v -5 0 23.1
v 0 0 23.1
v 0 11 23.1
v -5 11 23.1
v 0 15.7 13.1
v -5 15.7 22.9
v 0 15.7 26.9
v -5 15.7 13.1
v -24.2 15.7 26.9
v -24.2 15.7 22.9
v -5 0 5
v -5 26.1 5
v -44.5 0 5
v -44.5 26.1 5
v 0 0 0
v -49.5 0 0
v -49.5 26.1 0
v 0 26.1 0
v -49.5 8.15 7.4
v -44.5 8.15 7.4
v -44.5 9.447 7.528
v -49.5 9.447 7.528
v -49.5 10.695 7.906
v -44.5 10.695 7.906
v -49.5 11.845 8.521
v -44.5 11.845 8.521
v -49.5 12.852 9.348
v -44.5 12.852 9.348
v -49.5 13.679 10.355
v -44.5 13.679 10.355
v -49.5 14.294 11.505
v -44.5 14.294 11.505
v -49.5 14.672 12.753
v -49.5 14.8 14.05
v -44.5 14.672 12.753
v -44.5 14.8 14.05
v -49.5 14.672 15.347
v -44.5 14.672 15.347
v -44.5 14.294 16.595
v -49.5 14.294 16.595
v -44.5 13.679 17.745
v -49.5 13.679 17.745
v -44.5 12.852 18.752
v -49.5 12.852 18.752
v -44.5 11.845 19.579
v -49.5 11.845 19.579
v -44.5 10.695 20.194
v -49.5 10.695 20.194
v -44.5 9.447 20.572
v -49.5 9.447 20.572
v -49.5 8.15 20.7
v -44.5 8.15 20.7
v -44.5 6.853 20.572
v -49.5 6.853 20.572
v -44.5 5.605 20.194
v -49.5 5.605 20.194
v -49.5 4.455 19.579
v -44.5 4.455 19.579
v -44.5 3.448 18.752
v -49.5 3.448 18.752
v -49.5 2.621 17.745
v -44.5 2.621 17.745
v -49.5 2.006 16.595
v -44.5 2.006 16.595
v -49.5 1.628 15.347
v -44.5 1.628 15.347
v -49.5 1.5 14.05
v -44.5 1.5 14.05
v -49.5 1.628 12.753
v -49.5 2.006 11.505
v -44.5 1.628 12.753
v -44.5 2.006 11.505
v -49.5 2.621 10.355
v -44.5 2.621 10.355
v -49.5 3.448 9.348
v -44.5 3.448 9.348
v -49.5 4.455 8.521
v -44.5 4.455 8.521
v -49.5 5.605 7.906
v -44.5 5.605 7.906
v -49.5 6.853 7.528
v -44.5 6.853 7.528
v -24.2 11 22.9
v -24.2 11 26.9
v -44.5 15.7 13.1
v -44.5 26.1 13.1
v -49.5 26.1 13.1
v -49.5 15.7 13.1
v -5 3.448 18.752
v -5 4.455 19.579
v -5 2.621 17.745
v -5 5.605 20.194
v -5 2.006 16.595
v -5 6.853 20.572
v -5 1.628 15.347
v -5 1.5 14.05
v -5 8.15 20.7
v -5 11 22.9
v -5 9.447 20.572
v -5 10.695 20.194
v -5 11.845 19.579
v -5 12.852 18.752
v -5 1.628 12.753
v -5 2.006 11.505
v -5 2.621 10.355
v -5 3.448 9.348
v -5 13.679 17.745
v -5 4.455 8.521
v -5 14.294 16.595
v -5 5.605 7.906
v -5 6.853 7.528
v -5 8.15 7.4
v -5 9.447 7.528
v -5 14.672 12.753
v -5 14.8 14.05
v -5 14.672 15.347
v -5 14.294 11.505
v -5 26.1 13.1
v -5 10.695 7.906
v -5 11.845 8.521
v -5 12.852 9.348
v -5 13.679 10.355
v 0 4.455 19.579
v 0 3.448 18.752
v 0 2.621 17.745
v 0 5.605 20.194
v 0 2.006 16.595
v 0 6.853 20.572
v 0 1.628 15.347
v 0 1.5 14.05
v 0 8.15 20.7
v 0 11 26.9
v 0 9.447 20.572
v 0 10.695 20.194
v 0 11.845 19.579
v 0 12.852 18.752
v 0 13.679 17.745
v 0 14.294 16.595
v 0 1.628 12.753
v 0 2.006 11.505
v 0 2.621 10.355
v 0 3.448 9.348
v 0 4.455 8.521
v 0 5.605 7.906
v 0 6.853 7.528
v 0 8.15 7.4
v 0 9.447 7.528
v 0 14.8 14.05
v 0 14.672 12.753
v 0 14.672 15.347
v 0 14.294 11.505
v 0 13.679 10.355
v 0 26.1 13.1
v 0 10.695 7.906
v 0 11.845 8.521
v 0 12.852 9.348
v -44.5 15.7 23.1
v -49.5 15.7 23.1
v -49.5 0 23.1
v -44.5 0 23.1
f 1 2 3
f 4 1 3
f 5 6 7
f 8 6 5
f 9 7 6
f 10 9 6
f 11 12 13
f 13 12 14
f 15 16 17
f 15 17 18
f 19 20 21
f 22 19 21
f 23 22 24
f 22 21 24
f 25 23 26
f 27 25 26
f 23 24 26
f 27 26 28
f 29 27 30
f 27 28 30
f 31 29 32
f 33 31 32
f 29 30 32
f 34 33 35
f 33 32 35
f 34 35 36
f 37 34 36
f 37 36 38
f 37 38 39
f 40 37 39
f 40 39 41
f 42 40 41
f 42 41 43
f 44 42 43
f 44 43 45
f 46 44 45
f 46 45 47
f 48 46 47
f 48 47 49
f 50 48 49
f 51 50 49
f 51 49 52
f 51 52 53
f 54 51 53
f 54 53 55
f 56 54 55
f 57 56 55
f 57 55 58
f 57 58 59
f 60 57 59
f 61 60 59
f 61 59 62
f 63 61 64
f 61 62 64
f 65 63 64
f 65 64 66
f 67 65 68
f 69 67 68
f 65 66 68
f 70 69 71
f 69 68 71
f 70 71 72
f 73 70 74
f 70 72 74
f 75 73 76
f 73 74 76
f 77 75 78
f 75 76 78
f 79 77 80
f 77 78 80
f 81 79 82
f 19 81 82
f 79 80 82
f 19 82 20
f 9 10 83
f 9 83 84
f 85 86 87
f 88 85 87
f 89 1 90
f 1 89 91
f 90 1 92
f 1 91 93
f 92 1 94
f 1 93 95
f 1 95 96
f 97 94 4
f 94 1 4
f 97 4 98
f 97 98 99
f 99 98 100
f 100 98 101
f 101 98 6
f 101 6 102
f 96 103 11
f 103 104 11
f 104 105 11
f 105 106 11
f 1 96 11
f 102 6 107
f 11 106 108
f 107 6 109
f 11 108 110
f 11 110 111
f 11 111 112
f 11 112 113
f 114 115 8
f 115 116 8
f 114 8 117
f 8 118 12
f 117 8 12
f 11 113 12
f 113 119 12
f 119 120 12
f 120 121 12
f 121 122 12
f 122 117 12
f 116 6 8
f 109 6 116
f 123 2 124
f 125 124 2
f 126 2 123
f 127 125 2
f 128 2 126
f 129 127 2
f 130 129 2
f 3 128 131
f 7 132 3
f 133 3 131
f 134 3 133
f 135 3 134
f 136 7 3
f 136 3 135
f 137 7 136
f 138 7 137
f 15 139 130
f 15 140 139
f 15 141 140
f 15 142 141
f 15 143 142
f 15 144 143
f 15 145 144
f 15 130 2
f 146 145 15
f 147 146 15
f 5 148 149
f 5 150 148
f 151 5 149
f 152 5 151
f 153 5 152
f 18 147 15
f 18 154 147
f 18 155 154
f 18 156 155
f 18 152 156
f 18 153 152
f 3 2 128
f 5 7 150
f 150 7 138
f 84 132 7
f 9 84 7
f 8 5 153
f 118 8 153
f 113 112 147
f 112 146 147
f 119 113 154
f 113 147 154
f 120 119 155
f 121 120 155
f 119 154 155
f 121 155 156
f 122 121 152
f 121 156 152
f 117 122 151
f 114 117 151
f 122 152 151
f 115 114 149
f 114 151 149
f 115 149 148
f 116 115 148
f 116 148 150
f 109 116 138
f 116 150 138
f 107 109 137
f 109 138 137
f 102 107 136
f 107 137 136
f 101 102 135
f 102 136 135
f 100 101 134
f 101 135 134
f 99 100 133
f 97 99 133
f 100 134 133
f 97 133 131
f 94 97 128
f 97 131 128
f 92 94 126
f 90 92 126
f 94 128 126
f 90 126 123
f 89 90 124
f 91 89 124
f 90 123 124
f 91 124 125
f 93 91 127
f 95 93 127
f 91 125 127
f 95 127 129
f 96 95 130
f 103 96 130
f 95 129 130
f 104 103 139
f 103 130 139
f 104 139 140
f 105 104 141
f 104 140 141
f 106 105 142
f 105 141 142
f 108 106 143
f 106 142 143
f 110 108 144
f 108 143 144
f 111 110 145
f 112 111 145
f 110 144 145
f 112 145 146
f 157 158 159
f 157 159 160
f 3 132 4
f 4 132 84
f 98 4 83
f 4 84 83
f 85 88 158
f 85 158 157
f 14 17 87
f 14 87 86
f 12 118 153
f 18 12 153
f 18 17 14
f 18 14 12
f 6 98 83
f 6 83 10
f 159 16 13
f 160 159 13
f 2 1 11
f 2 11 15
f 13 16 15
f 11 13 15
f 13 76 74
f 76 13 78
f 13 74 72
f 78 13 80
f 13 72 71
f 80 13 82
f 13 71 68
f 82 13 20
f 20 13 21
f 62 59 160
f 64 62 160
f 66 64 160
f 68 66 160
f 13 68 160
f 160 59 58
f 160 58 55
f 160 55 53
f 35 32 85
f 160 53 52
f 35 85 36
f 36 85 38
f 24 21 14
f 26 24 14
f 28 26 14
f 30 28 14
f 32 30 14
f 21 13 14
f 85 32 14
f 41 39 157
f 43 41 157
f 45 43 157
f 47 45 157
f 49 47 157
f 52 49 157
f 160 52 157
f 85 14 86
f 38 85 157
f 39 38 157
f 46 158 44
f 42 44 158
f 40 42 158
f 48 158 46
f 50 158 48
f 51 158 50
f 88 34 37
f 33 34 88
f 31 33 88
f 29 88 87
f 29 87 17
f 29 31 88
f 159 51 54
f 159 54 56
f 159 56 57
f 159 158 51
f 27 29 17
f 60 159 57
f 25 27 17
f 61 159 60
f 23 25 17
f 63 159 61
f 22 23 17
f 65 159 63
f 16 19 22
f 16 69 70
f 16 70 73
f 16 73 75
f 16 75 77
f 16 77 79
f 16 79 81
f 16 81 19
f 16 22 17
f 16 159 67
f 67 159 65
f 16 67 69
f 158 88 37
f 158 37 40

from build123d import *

# Parameters (mm, degrees)
CROQUIS2_W              = 49.5
CROQUIS2_H              = 26.9
SALIENTE_EXTRUIR1_DEPTH = 26.1
CORTAR_EXTRUIR2_DEPTH   = 26.1
CORTAR_EXTRUIR3_REACH   = 64.089
CROQUIS3_W              = 13.8
CROQUIS3_H              = 10.4
CORTAR_EXTRUIR4_REACH   = 60.181
CROQUIS9_R              = 6.65
CORTAR_EXTRUIR5_REACH   = 64.089
CROQUIS8_R              = 6.65
CORTAR_EXTRUIR6_DEPTH   = 10.4
CROQUIS10_W             = 24.2
CROQUIS10_H             = 11
CORTAR_EXTRUIR7_DEPTH   = 3.8
CROQUIS13_W             = 19.2
CROQUIS13_H             = 11
CORTAR_EXTRUIR8_DEPTH   = 0.2
CORTAR_EXTRUIR9_REACH   = 64.089
CROQUIS14_W             = 3.8
CROQUIS14_H             = 15.7
CROQUIS16_W             = 4
CROQUIS16_H             = 4.7
SALIENTE_EXTRUIR2_DEPTH = 19.2
CROQUIS17_W             = 3.8
CROQUIS17_H             = 4.7
SALIENTE_EXTRUIR3_DEPTH = 5
CORTAR_EXTRUIR10_REACH  = 60.326


with BuildPart() as part:
    # Croquis2 → Saliente-Extruir1 (new body)
    with BuildSketch(Plane(origin=(0, 0, 0), x_dir=(1, 0, 0), z_dir=(0, 1, 0))):
        with Locations((-24.75, -13.45)):
            Rectangle(CROQUIS2_W, CROQUIS2_H)
    extrude(amount=SALIENTE_EXTRUIR1_DEPTH)

    # Croquis6 → Cortar-Extruir2 (cut)
    with BuildSketch(Plane(origin=(0, 26.1, 0), x_dir=(1, 0, 0), z_dir=(0, 1, 0))):
        Polygon((-44.5, -21.9), (-44.5, -22.9), (-25.3, -22.9), (-25.3, -26.9), (-5, -26.9), (-5, -21.9), (-5, -5), (-44.5, -5), align=None)
    extrude(amount=-CORTAR_EXTRUIR2_DEPTH, mode=Mode.SUBTRACT)

    # Croquis3 → Cortar-Extruir3 (cut, up to next)
    with BuildSketch(Plane(origin=(0, 0, 0), x_dir=(0, 0, -1), z_dir=(1, 0, 0)), mode=Mode.PRIVATE) as cortar_extruir3_sk1:
        with Locations((-20, 20.9)):
            Rectangle(CROQUIS3_W, CROQUIS3_H)
    cortar_extruir3_tool1 = extrude(cortar_extruir3_sk1.sketch, amount=-CORTAR_EXTRUIR3_REACH, mode=Mode.PRIVATE) & part.part
    add(cortar_extruir3_tool1.solids().sort_by_distance((0, 20.9, 20))[0], mode=Mode.SUBTRACT)

    # Croquis9 → Cortar-Extruir4 (cut, up to next)
    with BuildSketch(Plane(origin=(-44.5, 0, 0), x_dir=(0, 0, -1), z_dir=(1, 0, 0)), mode=Mode.PRIVATE) as cortar_extruir4_sk1:
        with Locations((-14.05, 8.15)):
            Circle(CROQUIS9_R)
    cortar_extruir4_tool1 = extrude(cortar_extruir4_sk1.sketch, amount=-CORTAR_EXTRUIR4_REACH, mode=Mode.PRIVATE) & part.part
    add(cortar_extruir4_tool1.solids().sort_by_distance((-44.5, 8.15, 14.05))[0], mode=Mode.SUBTRACT)

    # Croquis8 → Cortar-Extruir5 (cut, up to next)
    with BuildSketch(Plane(origin=(0, 0, 0), x_dir=(0, 0, -1), z_dir=(1, 0, 0)), mode=Mode.PRIVATE) as cortar_extruir5_sk1:
        with Locations((-14.05, 8.15)):
            Circle(CROQUIS8_R)
    cortar_extruir5_tool1 = extrude(cortar_extruir5_sk1.sketch, amount=-CORTAR_EXTRUIR5_REACH, mode=Mode.PRIVATE) & part.part
    add(cortar_extruir5_tool1.solids().sort_by_distance((0, 8.15, 14.05))[0], mode=Mode.SUBTRACT)

    # Croquis11 → Cortar-Extruir6 (cut)
    with BuildSketch(Plane(origin=(0, 26.1, 0), x_dir=(1, 0, 0), z_dir=(0, 1, 0))):
        Polygon((-44.5, -13.1), (-49.5, -13.1), (-49.5, -26.9), (-25.3, -26.9), (-25.3, -22.9), (-44.5, -22.9), align=None)
    extrude(amount=-CORTAR_EXTRUIR6_DEPTH, mode=Mode.SUBTRACT)

    # Croquis10 → Cortar-Extruir7 (cut)
    with BuildSketch(Plane.XY.offset(26.9)):
        with Locations((-37.4, 5.5)):
            Rectangle(CROQUIS10_W, CROQUIS10_H)
    extrude(amount=-CORTAR_EXTRUIR7_DEPTH, mode=Mode.SUBTRACT)

    # Croquis13 → Cortar-Extruir8 (cut)
    with BuildSketch(Plane(origin=(0, 0, 22.9), x_dir=(-1, 0, 0), z_dir=(0, 0, -1))):
        with Locations((34.9, 5.5)):
            Rectangle(CROQUIS13_W, CROQUIS13_H)
    extrude(amount=-CORTAR_EXTRUIR8_DEPTH, mode=Mode.SUBTRACT)

    # Croquis14 → Cortar-Extruir9 (cut, up to next)
    with BuildSketch(Plane(origin=(0, 0, 0), x_dir=(0, 0, -1), z_dir=(1, 0, 0)), mode=Mode.PRIVATE) as cortar_extruir9_sk1:
        with Locations((-25, 7.85)):
            Rectangle(CROQUIS14_W, CROQUIS14_H)
    cortar_extruir9_tool1 = extrude(cortar_extruir9_sk1.sketch, amount=-CORTAR_EXTRUIR9_REACH, mode=Mode.PRIVATE) & part.part
    add(cortar_extruir9_tool1.solids().sort_by_distance((0, 7.85, 25))[0], mode=Mode.SUBTRACT)

    # Croquis16 → Saliente-Extruir2 (add)
    with BuildSketch(Plane.ZY.offset(5)):
        with Locations((24.9, 13.35)):
            Rectangle(CROQUIS16_W, CROQUIS16_H)
    extrude(amount=SALIENTE_EXTRUIR2_DEPTH)

    # Croquis17 → Saliente-Extruir3 (add)
    with BuildSketch(Plane(origin=(-5, 0, 0), x_dir=(0, 0, -1), z_dir=(1, 0, 0))):
        with Locations((-25, 13.35)):
            Rectangle(CROQUIS17_W, CROQUIS17_H)
    extrude(amount=SALIENTE_EXTRUIR3_DEPTH)

    # Croquis18 → Cortar-Extruir10 (cut, up to next)
    with BuildSketch(Plane.XZ.offset(-11), mode=Mode.PRIVATE) as cortar_extruir10_sk1:
        Polygon((-25.3, 26.9), (-49.5, 26.9), (-49.5, 23.1), (-44.5, 23.1), (-44.5, 22.9), (-25.3, 22.9), align=None)
    cortar_extruir10_tool1 = extrude(cortar_extruir10_sk1.sketch, amount=-CORTAR_EXTRUIR10_REACH, mode=Mode.PRIVATE) & part.part
    add(cortar_extruir10_tool1.solids().sort_by_distance((-37.299791, 11, 24.919833))[0], mode=Mode.SUBTRACT)


solid = part.part
